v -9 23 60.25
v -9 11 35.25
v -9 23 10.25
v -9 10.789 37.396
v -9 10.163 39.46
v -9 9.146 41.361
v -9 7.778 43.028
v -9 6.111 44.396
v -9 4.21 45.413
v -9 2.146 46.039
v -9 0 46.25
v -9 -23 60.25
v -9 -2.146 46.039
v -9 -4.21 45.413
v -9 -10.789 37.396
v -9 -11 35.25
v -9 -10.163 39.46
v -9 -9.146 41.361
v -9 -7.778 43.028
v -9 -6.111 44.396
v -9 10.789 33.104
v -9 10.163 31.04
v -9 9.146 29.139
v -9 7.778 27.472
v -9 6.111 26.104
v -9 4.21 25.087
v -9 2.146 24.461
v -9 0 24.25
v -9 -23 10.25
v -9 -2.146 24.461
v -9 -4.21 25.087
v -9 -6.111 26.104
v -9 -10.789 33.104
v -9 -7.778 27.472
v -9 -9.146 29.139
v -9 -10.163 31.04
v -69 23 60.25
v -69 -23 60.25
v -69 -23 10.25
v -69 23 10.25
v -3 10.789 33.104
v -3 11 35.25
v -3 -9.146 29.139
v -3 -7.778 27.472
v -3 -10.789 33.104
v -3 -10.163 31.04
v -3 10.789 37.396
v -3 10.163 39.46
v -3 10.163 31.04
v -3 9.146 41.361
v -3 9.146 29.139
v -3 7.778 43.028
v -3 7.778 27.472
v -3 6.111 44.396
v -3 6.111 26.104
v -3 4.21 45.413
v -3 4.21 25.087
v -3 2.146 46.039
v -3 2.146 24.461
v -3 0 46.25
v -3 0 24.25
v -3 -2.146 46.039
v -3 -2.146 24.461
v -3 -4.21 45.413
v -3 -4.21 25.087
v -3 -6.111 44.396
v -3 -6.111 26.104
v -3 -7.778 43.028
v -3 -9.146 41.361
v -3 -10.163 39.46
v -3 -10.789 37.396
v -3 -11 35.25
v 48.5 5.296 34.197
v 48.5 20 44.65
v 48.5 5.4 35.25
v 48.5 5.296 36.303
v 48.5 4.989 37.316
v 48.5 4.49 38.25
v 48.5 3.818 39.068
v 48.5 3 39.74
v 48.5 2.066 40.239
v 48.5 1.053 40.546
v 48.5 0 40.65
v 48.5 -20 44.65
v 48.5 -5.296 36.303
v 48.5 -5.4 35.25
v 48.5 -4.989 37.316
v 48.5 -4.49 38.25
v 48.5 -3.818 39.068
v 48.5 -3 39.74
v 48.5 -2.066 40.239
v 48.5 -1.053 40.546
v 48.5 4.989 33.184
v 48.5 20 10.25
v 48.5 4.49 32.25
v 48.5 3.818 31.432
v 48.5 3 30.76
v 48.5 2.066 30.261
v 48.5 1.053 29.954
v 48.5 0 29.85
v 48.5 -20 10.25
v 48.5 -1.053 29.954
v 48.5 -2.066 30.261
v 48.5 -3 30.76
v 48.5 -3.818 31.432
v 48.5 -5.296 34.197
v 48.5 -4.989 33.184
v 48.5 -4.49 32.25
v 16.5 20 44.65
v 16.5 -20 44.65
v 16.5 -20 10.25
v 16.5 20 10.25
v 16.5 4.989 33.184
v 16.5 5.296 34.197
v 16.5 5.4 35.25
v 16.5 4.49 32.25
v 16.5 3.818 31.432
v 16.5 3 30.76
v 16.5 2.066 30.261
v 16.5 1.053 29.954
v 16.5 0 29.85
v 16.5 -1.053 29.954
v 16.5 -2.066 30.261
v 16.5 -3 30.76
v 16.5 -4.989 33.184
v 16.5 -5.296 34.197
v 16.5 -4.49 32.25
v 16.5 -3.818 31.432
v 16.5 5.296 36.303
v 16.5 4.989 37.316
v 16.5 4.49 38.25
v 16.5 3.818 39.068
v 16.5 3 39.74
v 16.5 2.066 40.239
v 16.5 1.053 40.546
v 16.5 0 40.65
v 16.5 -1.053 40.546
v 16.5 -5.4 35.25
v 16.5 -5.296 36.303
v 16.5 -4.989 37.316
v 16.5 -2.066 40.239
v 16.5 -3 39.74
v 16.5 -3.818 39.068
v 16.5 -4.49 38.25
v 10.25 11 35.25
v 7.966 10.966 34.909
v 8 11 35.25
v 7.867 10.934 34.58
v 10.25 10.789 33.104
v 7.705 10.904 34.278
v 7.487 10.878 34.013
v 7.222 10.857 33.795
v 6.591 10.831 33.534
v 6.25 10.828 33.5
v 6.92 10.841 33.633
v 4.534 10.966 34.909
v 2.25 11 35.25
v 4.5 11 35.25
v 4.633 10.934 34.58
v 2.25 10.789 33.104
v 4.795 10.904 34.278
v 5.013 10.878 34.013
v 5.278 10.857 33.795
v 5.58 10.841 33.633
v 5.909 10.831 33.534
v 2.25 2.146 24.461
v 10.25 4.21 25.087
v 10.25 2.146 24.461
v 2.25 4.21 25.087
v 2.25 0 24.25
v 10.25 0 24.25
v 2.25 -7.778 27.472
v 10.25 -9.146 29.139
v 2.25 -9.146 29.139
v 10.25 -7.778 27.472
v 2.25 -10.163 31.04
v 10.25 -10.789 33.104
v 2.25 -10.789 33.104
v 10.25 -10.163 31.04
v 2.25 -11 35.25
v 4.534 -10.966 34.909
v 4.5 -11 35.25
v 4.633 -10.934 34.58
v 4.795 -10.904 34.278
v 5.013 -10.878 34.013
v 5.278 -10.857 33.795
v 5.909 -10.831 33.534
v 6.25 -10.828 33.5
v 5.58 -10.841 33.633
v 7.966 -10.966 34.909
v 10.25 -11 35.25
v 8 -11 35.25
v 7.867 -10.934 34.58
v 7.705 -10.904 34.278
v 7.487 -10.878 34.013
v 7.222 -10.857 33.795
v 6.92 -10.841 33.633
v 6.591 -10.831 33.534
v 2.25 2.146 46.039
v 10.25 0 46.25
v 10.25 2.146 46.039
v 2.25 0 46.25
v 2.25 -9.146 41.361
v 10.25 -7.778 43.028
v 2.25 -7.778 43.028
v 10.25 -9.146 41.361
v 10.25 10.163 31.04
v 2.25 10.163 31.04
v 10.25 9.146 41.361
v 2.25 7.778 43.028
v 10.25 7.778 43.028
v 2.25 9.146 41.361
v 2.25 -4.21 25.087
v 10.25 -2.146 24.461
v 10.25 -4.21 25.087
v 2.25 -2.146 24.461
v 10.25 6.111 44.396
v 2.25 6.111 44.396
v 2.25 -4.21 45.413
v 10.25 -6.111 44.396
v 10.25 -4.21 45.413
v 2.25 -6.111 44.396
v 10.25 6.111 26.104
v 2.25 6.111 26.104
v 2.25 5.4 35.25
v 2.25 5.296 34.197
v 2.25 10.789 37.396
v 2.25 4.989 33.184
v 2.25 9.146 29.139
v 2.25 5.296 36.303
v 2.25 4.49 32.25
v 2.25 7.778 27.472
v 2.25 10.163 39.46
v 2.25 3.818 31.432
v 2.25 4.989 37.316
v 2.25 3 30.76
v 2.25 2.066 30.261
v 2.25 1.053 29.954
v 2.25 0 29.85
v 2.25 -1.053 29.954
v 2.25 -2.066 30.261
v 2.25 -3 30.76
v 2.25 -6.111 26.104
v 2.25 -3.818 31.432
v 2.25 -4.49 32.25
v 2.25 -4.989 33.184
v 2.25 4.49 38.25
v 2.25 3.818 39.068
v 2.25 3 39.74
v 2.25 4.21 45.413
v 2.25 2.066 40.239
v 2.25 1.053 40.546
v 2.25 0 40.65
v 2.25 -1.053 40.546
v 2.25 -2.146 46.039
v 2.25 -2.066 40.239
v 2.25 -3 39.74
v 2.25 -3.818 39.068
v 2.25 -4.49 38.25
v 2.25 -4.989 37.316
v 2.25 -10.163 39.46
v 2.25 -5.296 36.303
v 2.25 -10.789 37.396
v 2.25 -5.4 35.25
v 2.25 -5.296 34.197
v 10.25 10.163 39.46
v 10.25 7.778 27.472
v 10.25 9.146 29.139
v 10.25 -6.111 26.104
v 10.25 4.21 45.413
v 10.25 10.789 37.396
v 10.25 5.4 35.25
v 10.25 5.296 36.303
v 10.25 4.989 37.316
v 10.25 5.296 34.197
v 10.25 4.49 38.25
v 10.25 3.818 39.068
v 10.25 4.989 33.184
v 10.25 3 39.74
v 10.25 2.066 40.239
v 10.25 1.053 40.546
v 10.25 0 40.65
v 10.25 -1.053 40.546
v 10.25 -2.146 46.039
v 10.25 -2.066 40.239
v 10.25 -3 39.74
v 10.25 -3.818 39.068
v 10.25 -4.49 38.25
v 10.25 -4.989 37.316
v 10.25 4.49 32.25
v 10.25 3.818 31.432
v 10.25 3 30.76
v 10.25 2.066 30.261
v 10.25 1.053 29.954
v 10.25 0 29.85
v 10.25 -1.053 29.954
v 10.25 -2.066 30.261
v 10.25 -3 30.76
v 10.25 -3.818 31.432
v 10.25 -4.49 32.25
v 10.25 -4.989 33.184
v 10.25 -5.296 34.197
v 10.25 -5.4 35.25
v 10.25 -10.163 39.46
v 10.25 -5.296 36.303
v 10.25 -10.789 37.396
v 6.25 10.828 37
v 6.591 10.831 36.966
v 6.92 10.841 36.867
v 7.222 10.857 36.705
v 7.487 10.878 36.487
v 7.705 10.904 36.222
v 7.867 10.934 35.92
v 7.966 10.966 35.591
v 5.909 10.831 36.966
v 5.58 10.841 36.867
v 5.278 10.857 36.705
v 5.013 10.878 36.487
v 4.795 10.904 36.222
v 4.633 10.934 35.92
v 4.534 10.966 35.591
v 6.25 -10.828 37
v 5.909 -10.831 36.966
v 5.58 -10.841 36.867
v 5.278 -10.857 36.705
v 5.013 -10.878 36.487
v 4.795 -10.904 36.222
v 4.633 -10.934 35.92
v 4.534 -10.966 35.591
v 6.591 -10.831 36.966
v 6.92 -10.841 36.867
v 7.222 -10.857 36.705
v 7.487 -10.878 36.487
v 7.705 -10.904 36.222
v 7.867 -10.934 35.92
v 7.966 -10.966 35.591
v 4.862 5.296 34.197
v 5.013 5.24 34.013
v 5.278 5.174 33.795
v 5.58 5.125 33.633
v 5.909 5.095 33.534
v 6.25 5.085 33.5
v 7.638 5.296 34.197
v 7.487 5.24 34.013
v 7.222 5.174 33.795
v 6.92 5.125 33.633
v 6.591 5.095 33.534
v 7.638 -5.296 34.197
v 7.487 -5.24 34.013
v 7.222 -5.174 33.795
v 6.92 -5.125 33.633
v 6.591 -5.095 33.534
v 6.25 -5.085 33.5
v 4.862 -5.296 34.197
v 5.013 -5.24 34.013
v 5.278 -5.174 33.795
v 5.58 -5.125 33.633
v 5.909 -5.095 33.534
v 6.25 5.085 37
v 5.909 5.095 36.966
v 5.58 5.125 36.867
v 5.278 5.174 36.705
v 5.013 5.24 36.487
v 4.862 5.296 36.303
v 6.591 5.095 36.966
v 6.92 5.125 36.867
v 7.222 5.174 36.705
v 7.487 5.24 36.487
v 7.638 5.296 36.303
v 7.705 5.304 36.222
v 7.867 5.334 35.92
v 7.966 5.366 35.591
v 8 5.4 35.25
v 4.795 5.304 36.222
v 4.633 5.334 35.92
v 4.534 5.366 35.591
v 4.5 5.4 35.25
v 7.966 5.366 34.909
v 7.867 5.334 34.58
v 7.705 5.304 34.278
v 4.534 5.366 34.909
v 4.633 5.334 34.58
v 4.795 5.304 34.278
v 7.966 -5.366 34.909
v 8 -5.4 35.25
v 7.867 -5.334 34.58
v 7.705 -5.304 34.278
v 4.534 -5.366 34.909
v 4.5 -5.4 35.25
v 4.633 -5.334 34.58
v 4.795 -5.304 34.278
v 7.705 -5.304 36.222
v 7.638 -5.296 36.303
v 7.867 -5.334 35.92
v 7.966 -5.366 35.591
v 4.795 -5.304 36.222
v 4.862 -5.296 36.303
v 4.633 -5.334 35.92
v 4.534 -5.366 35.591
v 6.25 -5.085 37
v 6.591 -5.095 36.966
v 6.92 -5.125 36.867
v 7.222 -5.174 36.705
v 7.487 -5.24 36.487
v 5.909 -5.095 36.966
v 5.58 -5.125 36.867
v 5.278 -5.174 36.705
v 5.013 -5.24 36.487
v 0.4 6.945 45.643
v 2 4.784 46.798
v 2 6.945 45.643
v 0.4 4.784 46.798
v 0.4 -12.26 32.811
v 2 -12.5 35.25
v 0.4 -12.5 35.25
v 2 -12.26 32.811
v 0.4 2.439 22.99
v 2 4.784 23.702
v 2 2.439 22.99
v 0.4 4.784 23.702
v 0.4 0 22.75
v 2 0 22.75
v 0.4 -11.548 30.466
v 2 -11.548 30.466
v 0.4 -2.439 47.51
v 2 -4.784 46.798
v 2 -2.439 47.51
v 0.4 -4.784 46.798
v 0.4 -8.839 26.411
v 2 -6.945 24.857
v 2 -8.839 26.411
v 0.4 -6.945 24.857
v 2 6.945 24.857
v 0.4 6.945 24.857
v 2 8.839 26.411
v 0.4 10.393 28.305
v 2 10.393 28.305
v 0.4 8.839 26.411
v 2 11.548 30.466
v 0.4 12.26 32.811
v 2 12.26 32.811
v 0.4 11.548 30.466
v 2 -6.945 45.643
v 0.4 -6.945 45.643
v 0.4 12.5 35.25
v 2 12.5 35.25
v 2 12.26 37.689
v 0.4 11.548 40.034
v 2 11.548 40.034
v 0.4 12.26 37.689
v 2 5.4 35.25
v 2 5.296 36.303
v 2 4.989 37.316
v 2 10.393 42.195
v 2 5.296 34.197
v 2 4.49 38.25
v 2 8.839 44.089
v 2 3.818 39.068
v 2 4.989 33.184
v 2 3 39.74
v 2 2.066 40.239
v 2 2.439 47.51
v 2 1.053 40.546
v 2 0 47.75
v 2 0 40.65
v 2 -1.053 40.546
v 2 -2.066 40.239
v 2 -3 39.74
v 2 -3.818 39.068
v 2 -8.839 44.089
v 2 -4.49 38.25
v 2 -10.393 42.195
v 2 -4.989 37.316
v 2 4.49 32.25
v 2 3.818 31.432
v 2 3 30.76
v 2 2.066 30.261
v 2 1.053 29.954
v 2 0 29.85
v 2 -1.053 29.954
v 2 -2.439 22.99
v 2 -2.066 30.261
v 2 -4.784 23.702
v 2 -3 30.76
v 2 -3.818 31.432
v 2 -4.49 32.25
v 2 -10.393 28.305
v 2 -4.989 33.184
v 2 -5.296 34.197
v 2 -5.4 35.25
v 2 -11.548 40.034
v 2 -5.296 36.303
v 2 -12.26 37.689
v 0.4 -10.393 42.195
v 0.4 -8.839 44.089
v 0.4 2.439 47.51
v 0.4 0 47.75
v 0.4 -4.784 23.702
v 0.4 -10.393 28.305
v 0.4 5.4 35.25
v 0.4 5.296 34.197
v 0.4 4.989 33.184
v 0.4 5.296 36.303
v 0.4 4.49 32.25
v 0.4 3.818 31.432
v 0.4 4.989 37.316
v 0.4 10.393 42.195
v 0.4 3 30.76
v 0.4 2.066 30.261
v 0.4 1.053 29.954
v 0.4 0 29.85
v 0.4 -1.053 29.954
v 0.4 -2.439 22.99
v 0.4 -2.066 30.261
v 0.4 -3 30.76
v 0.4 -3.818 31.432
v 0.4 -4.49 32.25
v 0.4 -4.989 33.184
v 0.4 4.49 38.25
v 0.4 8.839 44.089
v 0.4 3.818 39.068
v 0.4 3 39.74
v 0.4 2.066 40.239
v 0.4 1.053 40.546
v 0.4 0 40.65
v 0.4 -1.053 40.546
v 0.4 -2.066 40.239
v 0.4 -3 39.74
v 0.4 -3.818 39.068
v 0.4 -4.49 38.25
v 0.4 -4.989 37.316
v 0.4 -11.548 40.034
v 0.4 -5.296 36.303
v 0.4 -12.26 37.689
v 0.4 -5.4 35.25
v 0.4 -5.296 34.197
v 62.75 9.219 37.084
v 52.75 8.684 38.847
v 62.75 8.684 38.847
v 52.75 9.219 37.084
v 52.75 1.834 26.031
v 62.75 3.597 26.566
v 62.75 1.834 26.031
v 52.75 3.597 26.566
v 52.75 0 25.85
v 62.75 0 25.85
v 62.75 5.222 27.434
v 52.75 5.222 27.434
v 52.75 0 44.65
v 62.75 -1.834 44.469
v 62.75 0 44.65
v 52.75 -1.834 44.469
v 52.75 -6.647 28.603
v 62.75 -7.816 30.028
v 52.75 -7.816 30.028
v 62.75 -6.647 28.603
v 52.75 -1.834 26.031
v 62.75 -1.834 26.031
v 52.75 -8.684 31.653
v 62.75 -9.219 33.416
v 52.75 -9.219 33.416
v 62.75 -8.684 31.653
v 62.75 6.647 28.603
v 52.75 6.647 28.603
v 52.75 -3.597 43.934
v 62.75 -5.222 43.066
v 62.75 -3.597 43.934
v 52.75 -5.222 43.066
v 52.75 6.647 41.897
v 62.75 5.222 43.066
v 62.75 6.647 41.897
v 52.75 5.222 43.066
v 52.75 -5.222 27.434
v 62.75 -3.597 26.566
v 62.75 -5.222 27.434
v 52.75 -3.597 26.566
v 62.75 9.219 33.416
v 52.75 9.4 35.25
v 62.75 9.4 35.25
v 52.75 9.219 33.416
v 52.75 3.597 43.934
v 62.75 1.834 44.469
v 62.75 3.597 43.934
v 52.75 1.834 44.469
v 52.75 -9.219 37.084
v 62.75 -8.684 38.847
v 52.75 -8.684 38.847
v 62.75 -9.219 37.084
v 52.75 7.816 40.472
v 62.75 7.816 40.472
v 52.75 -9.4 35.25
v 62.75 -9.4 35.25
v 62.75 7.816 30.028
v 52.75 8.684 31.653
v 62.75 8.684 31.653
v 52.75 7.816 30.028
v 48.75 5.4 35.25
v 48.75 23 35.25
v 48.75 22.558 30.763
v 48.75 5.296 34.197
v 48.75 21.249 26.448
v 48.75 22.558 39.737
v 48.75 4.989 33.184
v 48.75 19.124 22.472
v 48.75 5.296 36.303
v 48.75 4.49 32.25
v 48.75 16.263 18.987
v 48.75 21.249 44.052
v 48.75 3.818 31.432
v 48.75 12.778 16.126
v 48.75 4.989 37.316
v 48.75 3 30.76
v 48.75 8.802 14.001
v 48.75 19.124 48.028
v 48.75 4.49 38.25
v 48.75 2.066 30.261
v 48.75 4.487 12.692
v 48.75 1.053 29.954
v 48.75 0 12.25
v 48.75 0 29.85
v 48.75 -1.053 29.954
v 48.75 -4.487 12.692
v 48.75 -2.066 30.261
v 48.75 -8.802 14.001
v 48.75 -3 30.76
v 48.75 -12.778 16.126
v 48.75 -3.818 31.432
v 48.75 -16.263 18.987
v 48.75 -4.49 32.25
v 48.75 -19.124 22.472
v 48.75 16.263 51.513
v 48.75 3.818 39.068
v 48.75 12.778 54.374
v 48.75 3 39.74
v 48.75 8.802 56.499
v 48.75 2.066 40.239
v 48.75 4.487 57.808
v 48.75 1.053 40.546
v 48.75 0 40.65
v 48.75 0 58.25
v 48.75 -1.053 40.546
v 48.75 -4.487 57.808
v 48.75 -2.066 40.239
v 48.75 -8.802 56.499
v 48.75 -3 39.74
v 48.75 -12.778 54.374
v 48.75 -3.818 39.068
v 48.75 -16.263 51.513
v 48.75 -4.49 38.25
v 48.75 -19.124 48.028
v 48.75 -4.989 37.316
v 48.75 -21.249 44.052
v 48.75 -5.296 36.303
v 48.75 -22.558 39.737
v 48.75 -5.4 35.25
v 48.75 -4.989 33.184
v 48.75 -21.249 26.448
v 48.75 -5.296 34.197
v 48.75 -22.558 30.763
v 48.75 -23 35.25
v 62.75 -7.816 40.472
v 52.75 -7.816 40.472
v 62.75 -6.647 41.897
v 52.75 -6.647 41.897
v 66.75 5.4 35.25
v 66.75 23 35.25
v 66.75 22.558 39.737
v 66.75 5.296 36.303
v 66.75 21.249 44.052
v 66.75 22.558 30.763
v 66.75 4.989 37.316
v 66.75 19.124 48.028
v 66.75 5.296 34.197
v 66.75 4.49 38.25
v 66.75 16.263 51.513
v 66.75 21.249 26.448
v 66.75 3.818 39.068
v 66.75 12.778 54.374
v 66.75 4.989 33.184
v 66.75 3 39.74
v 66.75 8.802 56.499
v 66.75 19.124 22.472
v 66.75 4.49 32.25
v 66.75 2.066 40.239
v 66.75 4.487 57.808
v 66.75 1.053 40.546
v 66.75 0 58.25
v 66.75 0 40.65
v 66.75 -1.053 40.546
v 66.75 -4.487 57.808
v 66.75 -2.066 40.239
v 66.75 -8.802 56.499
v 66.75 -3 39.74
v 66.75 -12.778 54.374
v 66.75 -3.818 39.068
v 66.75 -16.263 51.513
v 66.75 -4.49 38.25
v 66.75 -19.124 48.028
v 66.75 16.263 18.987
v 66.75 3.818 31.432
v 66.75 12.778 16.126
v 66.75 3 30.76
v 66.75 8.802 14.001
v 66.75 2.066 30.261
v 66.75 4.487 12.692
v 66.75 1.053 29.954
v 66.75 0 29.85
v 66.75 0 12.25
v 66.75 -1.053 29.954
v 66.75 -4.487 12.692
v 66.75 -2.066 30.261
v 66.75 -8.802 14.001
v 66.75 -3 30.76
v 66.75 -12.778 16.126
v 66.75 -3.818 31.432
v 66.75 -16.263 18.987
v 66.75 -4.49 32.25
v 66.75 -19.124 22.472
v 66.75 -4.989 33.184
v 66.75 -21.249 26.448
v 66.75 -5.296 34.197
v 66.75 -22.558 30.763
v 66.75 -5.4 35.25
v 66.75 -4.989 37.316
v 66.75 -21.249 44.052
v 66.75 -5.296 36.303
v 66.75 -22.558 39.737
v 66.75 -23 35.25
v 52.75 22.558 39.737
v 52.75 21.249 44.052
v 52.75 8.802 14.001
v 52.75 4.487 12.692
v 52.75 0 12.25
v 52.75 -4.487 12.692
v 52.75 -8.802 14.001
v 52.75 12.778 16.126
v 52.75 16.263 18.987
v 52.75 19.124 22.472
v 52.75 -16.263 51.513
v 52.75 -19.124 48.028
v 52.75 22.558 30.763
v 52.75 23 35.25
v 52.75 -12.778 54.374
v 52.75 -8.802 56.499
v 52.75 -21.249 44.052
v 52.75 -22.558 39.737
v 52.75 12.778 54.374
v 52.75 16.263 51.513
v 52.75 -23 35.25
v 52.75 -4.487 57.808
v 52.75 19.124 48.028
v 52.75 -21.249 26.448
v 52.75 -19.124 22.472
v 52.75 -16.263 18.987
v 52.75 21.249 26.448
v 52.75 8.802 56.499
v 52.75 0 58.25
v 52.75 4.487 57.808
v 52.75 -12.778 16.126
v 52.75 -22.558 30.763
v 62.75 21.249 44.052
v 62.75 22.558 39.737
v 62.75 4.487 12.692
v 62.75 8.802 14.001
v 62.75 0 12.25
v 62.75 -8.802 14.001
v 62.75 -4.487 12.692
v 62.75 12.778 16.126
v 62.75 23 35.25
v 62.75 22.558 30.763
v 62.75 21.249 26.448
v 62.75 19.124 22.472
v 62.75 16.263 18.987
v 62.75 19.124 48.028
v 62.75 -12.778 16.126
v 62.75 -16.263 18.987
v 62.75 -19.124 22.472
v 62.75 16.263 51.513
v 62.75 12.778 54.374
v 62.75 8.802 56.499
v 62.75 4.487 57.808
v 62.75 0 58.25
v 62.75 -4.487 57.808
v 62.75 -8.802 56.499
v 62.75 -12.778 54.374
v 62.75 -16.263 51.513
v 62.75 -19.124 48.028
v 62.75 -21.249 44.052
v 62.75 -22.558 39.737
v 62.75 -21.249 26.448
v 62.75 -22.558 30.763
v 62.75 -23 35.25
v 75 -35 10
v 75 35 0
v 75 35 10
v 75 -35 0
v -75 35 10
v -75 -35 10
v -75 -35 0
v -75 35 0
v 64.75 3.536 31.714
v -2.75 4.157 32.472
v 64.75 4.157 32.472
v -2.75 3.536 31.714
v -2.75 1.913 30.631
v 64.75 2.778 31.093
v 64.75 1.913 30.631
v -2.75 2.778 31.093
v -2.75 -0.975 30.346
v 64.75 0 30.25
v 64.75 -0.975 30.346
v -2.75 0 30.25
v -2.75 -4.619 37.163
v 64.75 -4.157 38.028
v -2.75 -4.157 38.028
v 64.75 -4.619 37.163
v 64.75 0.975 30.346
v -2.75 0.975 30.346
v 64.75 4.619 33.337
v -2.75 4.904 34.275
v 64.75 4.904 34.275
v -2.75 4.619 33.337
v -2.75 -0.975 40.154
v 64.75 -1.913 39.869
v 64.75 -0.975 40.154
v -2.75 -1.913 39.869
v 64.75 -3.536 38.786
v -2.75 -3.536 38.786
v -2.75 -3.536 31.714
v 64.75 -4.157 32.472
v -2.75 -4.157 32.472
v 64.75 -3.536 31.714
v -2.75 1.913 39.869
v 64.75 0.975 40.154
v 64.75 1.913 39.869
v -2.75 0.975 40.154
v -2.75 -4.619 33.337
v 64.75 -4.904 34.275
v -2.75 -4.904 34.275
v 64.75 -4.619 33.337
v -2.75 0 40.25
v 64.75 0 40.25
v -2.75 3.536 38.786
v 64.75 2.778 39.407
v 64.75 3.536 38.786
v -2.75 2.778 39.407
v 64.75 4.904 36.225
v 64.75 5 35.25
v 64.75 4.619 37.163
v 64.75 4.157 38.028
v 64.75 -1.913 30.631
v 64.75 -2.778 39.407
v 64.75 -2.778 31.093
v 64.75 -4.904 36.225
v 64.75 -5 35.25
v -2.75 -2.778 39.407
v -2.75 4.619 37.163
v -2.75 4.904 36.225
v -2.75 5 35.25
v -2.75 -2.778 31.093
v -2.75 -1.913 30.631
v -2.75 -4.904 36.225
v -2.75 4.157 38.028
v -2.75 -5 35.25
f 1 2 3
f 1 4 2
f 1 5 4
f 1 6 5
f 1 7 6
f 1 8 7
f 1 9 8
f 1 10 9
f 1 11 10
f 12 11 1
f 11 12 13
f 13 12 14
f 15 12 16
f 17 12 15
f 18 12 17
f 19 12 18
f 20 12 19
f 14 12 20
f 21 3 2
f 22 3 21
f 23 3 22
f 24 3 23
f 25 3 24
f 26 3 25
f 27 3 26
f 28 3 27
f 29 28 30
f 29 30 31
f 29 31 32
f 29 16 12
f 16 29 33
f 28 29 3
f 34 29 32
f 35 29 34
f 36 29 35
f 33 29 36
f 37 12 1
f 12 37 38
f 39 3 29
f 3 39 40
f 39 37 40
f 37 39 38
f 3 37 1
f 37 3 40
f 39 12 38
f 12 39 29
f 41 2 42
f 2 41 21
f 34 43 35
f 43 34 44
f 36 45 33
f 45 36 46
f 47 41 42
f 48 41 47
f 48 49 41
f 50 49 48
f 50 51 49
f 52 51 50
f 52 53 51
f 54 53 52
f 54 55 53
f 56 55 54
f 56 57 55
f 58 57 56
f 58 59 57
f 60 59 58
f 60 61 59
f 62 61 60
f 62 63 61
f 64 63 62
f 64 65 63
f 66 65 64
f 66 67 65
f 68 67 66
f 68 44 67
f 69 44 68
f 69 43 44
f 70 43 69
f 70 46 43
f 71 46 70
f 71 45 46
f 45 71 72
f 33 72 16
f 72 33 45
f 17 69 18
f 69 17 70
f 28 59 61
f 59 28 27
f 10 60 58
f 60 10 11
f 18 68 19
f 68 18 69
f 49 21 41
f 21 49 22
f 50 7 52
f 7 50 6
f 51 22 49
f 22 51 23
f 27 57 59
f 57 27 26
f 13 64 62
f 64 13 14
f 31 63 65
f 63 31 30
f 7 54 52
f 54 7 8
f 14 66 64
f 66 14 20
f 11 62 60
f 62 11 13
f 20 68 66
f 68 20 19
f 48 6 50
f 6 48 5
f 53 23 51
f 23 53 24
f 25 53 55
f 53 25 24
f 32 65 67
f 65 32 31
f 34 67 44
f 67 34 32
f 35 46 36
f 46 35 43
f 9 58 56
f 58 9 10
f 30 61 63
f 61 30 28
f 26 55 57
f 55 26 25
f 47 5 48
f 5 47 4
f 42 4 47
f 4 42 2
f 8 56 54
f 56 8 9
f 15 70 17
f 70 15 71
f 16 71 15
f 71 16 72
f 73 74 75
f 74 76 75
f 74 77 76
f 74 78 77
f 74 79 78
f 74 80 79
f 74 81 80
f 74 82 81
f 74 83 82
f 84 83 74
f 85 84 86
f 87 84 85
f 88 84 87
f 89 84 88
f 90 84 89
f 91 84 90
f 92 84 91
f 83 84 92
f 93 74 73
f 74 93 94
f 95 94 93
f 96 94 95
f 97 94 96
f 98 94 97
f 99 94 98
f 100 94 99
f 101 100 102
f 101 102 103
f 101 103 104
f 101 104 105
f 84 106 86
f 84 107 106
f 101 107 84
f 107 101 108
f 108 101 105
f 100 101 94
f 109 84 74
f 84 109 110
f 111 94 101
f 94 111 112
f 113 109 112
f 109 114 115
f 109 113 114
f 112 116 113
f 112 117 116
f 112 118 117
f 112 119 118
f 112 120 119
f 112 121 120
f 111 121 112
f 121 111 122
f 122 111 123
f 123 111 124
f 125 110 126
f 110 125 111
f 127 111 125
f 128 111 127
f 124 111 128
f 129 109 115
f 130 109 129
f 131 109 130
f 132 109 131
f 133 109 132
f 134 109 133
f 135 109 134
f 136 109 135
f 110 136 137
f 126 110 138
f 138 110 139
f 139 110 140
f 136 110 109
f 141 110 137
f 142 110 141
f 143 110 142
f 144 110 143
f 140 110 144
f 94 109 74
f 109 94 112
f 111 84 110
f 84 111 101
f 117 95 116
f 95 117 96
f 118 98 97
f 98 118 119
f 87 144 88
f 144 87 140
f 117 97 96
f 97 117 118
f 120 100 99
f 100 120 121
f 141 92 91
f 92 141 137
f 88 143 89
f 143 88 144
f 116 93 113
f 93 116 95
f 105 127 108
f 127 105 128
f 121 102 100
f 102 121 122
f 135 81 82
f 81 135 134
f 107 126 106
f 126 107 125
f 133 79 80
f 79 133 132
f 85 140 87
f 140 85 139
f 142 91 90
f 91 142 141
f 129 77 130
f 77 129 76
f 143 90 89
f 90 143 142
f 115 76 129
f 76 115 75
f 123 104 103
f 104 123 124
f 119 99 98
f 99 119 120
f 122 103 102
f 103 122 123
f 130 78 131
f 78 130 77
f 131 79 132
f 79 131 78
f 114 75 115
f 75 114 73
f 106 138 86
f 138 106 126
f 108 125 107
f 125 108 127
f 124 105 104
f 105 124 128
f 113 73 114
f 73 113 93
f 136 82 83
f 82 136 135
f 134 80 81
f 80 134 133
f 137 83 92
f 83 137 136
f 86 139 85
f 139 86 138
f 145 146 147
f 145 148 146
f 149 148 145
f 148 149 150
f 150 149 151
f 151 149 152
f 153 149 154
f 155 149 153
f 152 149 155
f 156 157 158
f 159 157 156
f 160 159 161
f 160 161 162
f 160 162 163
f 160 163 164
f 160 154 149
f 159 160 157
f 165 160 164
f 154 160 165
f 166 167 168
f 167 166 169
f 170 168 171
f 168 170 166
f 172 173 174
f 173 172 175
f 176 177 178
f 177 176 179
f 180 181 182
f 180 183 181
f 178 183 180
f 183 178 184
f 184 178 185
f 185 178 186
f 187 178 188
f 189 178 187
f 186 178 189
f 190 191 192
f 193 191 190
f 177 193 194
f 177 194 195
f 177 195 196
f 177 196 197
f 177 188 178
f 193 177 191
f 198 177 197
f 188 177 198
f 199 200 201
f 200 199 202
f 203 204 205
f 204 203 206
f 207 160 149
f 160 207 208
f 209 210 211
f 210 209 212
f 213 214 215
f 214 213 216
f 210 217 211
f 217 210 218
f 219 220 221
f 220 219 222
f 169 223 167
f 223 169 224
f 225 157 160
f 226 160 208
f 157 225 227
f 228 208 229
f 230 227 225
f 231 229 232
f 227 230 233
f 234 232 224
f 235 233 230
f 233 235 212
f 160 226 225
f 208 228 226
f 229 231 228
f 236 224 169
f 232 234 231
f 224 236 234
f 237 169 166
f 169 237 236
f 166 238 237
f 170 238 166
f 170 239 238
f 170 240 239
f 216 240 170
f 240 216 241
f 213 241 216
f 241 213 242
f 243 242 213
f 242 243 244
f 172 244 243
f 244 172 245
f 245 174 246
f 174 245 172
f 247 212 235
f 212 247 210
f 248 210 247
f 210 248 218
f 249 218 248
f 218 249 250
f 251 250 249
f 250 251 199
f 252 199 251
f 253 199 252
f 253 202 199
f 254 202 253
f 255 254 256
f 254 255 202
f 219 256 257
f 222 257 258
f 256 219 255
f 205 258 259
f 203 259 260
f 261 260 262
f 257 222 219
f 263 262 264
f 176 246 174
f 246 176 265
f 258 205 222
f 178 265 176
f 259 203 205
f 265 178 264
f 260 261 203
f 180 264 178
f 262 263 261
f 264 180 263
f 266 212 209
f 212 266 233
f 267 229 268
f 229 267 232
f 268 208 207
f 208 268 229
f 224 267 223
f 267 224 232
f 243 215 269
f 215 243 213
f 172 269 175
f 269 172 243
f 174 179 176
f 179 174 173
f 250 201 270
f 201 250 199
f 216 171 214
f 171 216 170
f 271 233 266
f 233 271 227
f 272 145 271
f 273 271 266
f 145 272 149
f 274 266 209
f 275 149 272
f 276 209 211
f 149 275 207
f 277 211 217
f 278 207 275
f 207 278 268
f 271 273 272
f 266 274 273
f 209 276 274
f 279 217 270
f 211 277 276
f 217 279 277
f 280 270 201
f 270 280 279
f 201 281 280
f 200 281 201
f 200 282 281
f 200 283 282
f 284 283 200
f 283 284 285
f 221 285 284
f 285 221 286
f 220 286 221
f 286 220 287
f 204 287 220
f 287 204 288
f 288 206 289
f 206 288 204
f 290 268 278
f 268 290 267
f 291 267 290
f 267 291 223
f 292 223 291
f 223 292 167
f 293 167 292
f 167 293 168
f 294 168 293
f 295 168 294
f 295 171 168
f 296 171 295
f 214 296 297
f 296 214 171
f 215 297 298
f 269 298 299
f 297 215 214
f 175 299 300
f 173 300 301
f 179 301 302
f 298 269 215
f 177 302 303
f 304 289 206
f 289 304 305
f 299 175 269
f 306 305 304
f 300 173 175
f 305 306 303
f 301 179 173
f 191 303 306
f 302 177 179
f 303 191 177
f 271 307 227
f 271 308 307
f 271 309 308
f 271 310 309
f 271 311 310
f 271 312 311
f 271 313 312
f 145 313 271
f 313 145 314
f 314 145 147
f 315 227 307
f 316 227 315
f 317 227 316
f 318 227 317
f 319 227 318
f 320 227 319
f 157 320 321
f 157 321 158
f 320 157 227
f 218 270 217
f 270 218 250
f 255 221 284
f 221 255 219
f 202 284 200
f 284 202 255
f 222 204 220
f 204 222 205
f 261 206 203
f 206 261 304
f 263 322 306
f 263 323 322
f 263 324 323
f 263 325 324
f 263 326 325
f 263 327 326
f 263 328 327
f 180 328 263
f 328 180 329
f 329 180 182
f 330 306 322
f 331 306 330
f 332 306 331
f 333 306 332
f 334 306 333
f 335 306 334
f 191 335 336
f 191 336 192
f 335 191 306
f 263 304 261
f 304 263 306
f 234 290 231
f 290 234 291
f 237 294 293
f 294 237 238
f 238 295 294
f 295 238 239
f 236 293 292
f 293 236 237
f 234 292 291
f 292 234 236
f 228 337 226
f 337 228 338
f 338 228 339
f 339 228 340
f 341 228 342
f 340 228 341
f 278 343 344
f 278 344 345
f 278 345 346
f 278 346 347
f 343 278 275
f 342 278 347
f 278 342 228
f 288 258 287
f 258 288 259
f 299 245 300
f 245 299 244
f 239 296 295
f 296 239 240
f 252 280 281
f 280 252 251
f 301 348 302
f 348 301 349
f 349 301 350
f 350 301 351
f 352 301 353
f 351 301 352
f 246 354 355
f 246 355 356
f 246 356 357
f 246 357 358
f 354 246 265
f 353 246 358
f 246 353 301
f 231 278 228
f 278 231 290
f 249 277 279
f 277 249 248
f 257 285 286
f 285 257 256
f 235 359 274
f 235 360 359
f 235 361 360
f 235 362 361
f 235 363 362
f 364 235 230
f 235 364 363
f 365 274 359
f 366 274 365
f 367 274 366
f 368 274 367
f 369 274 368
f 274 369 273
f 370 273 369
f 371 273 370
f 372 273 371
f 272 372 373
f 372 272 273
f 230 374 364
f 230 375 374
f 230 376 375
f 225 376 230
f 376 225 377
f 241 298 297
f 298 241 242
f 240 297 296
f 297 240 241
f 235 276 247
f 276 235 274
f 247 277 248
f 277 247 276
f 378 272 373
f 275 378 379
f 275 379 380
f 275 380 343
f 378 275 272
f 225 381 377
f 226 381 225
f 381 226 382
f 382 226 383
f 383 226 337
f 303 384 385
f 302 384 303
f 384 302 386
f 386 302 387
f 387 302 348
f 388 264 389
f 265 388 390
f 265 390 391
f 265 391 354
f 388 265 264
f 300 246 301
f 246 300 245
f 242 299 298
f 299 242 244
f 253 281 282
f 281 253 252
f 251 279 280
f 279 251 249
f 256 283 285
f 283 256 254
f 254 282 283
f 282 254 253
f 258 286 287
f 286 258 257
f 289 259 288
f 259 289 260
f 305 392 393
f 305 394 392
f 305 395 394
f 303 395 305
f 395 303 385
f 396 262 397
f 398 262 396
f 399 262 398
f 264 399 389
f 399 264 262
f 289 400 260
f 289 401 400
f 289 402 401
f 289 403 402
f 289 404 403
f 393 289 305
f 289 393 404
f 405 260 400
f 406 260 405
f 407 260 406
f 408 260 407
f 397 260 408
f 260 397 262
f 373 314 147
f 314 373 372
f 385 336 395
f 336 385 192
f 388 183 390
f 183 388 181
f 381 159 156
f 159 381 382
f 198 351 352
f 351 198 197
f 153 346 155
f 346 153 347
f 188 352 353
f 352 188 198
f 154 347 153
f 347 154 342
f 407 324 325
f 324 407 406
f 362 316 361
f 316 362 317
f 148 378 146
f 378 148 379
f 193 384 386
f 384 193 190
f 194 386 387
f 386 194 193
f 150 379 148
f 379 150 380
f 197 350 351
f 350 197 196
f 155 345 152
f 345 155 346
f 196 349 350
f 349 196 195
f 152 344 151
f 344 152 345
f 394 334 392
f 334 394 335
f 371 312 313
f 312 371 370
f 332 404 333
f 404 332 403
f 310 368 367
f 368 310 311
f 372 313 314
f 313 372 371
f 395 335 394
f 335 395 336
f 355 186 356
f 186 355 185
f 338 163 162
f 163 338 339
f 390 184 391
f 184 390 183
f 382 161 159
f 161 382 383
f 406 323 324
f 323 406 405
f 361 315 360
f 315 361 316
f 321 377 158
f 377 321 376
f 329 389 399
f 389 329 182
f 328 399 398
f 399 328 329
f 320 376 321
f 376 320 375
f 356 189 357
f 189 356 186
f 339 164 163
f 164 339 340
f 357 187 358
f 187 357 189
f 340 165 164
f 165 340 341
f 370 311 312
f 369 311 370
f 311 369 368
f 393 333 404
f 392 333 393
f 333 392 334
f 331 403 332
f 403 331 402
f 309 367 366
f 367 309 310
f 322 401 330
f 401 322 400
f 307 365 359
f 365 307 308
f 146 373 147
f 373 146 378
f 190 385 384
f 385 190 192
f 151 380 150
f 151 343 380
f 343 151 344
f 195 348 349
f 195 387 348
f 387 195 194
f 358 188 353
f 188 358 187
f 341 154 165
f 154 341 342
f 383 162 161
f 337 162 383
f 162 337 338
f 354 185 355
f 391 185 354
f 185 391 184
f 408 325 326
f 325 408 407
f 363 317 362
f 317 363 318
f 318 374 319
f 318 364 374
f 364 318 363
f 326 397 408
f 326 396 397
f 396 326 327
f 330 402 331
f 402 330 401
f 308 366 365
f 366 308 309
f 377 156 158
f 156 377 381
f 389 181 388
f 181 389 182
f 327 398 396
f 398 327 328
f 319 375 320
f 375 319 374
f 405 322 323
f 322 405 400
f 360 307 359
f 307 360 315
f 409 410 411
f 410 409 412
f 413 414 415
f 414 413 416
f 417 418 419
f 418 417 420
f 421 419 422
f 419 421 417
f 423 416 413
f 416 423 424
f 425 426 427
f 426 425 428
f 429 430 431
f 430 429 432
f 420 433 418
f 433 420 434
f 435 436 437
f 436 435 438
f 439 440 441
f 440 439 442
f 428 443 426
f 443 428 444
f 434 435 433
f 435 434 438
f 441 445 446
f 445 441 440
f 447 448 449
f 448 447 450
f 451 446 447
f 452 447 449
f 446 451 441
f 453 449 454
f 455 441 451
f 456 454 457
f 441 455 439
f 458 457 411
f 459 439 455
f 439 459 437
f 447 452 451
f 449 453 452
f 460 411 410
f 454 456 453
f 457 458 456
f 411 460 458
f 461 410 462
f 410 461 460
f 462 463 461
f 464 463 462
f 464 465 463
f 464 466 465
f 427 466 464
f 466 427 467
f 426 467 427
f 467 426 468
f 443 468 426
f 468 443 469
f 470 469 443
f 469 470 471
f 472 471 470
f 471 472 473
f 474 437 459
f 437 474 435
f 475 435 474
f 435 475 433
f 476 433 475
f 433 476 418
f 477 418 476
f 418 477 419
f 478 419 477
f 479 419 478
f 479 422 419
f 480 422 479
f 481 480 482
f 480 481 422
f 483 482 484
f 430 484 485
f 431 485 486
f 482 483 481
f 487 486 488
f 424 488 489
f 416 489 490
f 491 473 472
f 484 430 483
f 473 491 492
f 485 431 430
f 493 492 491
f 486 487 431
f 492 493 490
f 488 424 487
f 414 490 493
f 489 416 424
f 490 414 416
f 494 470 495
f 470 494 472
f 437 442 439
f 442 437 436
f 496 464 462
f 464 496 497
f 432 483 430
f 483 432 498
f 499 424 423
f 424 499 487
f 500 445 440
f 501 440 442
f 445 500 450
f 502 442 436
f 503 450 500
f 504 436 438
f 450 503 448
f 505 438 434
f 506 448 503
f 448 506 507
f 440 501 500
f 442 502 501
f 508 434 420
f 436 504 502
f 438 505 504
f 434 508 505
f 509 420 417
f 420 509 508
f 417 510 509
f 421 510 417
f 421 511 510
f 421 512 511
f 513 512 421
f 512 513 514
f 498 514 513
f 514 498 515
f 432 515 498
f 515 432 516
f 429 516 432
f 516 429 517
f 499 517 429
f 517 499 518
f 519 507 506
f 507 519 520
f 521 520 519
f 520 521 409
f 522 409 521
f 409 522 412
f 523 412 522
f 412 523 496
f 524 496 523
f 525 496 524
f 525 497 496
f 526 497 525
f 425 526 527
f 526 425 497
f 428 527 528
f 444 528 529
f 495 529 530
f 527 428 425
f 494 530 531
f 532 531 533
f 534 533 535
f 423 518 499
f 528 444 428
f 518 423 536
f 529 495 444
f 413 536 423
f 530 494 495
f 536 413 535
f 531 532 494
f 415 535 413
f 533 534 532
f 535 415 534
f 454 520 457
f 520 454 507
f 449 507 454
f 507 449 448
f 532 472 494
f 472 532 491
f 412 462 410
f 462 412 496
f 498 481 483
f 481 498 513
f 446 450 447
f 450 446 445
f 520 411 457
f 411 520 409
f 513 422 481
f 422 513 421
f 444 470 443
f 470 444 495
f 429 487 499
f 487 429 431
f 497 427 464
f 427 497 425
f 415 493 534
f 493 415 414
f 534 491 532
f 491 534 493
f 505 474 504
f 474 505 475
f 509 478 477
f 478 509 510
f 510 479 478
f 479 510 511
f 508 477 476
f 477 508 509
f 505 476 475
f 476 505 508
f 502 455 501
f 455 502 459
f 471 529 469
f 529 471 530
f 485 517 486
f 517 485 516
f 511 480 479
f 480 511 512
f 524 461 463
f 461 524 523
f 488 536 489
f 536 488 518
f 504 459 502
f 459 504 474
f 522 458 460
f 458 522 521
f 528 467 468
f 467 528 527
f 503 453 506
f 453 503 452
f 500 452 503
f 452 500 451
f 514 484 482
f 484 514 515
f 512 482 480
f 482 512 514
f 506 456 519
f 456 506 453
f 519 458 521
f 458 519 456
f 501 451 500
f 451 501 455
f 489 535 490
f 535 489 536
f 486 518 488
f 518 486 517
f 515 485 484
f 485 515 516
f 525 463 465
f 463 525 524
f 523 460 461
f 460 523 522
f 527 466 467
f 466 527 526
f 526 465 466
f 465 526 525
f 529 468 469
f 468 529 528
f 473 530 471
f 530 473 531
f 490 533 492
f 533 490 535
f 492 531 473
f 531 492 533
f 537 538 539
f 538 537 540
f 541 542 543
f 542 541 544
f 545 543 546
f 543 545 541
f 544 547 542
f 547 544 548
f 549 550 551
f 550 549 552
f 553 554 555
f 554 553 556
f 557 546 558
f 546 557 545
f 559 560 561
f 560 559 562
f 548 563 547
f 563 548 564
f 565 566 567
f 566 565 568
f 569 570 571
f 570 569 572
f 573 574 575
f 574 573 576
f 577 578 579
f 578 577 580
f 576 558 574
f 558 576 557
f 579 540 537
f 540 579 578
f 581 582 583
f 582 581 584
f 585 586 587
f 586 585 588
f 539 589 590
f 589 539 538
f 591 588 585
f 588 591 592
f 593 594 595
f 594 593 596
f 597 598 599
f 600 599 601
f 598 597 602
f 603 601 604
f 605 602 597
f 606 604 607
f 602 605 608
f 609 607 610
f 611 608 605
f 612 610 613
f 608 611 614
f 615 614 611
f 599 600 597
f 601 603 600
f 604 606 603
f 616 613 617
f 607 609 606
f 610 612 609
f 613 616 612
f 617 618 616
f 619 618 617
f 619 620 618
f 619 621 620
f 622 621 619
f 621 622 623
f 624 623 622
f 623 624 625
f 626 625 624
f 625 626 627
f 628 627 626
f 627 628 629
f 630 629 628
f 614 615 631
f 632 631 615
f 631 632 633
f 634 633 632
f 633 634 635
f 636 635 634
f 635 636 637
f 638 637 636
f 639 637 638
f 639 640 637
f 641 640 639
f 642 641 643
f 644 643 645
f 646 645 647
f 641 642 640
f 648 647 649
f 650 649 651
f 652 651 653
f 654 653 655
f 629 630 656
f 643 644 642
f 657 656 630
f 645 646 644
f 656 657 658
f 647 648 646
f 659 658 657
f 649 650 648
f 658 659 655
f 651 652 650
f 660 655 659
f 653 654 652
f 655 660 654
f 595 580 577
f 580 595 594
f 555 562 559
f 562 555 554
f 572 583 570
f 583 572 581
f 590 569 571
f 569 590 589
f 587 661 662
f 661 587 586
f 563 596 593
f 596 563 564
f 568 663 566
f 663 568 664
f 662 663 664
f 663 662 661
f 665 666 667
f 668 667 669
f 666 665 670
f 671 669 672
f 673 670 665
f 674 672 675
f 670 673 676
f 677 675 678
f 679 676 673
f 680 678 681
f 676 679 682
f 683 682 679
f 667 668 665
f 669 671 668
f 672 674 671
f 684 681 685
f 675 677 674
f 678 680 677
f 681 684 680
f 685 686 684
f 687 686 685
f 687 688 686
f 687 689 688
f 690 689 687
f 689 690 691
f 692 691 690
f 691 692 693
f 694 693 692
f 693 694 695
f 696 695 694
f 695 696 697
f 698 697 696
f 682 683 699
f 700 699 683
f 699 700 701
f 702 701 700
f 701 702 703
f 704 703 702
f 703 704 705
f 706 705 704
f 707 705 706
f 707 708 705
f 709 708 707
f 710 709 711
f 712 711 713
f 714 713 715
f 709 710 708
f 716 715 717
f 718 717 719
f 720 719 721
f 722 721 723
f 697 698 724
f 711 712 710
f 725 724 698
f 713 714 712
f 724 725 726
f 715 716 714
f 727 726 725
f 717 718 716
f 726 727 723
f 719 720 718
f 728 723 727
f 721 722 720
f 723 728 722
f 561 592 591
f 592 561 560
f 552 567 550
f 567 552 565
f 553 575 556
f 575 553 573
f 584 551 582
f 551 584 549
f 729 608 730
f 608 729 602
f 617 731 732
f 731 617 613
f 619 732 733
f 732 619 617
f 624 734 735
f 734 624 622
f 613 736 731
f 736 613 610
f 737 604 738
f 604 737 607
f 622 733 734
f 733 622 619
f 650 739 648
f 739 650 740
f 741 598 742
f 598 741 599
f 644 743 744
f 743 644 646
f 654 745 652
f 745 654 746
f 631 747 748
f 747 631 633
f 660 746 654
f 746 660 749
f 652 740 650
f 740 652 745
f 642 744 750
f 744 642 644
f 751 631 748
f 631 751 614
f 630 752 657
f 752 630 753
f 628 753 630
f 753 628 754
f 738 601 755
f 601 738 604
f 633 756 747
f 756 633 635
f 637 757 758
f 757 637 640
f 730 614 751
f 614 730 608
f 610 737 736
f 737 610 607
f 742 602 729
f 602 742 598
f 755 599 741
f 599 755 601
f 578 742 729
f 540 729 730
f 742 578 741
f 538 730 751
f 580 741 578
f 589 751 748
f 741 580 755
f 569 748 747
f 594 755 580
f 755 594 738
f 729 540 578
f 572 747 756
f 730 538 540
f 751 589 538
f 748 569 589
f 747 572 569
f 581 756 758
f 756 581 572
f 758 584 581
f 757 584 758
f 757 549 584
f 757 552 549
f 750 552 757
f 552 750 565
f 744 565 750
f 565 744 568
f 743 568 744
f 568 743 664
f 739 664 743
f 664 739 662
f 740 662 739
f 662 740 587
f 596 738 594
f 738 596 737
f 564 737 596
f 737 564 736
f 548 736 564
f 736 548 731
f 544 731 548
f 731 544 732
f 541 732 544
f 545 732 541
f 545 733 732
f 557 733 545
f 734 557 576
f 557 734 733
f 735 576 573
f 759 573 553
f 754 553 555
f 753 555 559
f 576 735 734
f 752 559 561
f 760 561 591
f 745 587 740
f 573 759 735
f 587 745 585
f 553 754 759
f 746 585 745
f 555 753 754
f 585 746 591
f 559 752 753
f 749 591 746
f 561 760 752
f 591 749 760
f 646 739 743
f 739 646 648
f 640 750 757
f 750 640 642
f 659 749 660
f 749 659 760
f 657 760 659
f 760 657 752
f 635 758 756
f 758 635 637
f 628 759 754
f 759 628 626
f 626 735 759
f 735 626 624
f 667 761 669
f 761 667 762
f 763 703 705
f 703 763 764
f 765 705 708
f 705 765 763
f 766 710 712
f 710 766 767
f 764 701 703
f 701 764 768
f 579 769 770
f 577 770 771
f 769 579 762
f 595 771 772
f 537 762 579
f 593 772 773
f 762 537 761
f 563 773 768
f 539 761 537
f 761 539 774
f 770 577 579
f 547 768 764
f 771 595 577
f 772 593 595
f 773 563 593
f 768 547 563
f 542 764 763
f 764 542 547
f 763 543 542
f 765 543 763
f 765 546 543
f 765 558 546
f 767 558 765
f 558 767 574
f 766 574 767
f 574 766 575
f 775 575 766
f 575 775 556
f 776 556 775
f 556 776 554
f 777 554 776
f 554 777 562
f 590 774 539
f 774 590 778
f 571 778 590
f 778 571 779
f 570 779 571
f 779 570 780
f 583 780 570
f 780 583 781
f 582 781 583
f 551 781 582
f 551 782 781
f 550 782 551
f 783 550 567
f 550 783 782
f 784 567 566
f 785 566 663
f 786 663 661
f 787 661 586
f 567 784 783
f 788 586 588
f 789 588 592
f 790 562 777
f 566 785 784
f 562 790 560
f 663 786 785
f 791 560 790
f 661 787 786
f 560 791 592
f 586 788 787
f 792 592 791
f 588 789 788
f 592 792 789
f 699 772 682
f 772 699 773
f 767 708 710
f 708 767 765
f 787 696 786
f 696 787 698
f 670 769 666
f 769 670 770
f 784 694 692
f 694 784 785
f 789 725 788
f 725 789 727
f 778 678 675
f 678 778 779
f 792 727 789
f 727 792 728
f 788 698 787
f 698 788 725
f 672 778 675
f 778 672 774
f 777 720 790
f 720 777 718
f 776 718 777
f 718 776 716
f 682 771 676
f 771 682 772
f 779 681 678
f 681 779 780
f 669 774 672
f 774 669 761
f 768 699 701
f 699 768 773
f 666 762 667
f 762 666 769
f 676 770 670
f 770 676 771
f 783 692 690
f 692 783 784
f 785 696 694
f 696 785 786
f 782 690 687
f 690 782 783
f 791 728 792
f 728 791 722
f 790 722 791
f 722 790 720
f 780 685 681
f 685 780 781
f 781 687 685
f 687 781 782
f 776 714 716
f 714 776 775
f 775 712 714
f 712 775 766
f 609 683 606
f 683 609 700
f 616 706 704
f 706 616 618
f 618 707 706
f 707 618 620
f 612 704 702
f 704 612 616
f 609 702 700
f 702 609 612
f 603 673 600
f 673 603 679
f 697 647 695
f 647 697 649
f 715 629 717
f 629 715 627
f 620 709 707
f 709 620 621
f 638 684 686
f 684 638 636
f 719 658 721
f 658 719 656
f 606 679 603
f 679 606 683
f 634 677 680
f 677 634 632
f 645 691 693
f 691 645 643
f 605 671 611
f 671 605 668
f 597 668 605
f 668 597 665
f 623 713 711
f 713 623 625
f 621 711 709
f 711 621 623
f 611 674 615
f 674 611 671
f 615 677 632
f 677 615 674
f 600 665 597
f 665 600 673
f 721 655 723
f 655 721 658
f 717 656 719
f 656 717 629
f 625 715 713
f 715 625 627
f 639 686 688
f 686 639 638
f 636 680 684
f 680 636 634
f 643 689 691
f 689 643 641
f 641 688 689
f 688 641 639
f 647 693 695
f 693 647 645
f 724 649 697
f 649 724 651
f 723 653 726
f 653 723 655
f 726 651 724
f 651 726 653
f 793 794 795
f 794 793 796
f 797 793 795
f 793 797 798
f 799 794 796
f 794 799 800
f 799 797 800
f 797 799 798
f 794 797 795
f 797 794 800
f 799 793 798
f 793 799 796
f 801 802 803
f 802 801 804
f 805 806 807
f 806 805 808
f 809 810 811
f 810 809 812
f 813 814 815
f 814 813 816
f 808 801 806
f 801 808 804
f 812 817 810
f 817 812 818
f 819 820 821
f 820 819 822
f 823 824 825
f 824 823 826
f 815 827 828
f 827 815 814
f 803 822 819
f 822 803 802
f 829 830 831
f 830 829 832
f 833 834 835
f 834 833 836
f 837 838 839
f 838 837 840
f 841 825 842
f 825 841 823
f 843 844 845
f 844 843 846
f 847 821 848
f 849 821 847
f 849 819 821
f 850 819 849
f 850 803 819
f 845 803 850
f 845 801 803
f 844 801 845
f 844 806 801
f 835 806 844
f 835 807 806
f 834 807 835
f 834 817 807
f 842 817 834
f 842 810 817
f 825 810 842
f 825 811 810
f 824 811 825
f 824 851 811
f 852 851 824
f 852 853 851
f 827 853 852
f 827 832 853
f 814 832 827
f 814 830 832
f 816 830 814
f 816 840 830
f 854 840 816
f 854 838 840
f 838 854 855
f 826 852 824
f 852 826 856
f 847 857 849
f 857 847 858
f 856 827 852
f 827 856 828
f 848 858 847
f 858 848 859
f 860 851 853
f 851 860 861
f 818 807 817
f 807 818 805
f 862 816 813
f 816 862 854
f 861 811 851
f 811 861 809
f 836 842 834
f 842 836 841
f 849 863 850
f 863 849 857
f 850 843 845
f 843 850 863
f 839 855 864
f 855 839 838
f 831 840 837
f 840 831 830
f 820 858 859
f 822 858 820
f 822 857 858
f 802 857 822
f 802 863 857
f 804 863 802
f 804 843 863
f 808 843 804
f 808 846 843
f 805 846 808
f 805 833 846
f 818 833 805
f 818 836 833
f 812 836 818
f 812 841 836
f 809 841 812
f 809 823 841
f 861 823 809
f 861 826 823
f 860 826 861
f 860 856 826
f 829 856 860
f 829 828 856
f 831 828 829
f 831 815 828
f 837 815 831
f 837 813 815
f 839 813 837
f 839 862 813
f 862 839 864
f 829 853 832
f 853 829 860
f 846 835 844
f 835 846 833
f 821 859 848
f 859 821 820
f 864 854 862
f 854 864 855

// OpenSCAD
$fn = 32;

// ------------------------------------------------------------------------
// Motor drive station: motor 60 x 50 mm, shaft d10, pulley d46
// Every part is its own module, assembly() places every instance.
// ------------------------------------------------------------------------

// --- part 1 ---
module station_bed() {
  difference() {
    translate([-75, -35, 0]) cube([150, 70, 10]);
  }
}

// --- part 2 ---
module drive_motor() {
  union() {
    translate([-30, -23, 0]) cube([60, 46, 50]);
    translate([33, 0, 25]) rotate([0, 90, 0]) cylinder(h = 6, d = 22, center = true);
  }
}

// --- part 3 ---
module pillow_block() {
  difference() {
    translate([-16, -20, 0]) cube([32, 40, 34.4]);
    translate([0, 0, 25]) rotate([0, 90, 0]) cylinder(h = 34, d = 10.8, center = true);
  }
}

// --- part 4 ---
module drive_shaft() {
  translate([0, 0, -33.75]) cylinder(h = 67.5, d = 10);
}

// --- part 5 ---
module shaft_collar() {
  difference() {
    cylinder(h = 8, d = 22);
    translate([0, 0, -1]) cylinder(h = 10, d = 10.8);
    translate([0, 0, 4]) rotate([90, 0, 0]) cylinder(h = 24, d = 3.5, center = true);
  }
}

// --- part 6 ---
module collar_washer() {
  difference() {
      translate([0, 0, 0]) cylinder(h = 1.6, d = 25);
      translate([0, 0, -1]) cylinder(h = 3.6, d = 10.8);
    }
}

// --- part 7 ---
module drive_pulley() {
  difference() {
    union() {
      cylinder(h = 18, d = 18.8);
      cylinder(h = 4, d = 46);
      translate([0, 0, 14]) cylinder(h = 4, d = 46);
    }
    translate([0, 0, -1]) cylinder(h = 20, d = 10.8);
  }
}

// --- assembly ---
module assembly() {
  color([0.80, 0.24, 0.20]) translate([0, 0, 0]) rotate([0, 0, 0]) station_bed();
  color([0.20, 0.45, 0.75]) translate([-39, 0, 10.25]) rotate([0, 0, 0]) drive_motor();
  color([0.25, 0.62, 0.32]) translate([32.5, 0, 10.25]) rotate([0, 0, 0]) pillow_block();
  color([0.92, 0.70, 0.18]) translate([31, 0, 35.25]) rotate([0, 90, 0]) drive_shaft();
  color([0.58, 0.35, 0.70]) translate([2.25, 0, 35.25]) rotate([0, 90, 0]) shaft_collar();
  color([0.16, 0.66, 0.66]) translate([0.4, 0, 35.25]) rotate([0, 90, 0]) collar_washer();
  color([0.85, 0.48, 0.18]) translate([48.75, 0, 35.25]) rotate([0, 90, 0]) drive_pulley();
}

assembly();
